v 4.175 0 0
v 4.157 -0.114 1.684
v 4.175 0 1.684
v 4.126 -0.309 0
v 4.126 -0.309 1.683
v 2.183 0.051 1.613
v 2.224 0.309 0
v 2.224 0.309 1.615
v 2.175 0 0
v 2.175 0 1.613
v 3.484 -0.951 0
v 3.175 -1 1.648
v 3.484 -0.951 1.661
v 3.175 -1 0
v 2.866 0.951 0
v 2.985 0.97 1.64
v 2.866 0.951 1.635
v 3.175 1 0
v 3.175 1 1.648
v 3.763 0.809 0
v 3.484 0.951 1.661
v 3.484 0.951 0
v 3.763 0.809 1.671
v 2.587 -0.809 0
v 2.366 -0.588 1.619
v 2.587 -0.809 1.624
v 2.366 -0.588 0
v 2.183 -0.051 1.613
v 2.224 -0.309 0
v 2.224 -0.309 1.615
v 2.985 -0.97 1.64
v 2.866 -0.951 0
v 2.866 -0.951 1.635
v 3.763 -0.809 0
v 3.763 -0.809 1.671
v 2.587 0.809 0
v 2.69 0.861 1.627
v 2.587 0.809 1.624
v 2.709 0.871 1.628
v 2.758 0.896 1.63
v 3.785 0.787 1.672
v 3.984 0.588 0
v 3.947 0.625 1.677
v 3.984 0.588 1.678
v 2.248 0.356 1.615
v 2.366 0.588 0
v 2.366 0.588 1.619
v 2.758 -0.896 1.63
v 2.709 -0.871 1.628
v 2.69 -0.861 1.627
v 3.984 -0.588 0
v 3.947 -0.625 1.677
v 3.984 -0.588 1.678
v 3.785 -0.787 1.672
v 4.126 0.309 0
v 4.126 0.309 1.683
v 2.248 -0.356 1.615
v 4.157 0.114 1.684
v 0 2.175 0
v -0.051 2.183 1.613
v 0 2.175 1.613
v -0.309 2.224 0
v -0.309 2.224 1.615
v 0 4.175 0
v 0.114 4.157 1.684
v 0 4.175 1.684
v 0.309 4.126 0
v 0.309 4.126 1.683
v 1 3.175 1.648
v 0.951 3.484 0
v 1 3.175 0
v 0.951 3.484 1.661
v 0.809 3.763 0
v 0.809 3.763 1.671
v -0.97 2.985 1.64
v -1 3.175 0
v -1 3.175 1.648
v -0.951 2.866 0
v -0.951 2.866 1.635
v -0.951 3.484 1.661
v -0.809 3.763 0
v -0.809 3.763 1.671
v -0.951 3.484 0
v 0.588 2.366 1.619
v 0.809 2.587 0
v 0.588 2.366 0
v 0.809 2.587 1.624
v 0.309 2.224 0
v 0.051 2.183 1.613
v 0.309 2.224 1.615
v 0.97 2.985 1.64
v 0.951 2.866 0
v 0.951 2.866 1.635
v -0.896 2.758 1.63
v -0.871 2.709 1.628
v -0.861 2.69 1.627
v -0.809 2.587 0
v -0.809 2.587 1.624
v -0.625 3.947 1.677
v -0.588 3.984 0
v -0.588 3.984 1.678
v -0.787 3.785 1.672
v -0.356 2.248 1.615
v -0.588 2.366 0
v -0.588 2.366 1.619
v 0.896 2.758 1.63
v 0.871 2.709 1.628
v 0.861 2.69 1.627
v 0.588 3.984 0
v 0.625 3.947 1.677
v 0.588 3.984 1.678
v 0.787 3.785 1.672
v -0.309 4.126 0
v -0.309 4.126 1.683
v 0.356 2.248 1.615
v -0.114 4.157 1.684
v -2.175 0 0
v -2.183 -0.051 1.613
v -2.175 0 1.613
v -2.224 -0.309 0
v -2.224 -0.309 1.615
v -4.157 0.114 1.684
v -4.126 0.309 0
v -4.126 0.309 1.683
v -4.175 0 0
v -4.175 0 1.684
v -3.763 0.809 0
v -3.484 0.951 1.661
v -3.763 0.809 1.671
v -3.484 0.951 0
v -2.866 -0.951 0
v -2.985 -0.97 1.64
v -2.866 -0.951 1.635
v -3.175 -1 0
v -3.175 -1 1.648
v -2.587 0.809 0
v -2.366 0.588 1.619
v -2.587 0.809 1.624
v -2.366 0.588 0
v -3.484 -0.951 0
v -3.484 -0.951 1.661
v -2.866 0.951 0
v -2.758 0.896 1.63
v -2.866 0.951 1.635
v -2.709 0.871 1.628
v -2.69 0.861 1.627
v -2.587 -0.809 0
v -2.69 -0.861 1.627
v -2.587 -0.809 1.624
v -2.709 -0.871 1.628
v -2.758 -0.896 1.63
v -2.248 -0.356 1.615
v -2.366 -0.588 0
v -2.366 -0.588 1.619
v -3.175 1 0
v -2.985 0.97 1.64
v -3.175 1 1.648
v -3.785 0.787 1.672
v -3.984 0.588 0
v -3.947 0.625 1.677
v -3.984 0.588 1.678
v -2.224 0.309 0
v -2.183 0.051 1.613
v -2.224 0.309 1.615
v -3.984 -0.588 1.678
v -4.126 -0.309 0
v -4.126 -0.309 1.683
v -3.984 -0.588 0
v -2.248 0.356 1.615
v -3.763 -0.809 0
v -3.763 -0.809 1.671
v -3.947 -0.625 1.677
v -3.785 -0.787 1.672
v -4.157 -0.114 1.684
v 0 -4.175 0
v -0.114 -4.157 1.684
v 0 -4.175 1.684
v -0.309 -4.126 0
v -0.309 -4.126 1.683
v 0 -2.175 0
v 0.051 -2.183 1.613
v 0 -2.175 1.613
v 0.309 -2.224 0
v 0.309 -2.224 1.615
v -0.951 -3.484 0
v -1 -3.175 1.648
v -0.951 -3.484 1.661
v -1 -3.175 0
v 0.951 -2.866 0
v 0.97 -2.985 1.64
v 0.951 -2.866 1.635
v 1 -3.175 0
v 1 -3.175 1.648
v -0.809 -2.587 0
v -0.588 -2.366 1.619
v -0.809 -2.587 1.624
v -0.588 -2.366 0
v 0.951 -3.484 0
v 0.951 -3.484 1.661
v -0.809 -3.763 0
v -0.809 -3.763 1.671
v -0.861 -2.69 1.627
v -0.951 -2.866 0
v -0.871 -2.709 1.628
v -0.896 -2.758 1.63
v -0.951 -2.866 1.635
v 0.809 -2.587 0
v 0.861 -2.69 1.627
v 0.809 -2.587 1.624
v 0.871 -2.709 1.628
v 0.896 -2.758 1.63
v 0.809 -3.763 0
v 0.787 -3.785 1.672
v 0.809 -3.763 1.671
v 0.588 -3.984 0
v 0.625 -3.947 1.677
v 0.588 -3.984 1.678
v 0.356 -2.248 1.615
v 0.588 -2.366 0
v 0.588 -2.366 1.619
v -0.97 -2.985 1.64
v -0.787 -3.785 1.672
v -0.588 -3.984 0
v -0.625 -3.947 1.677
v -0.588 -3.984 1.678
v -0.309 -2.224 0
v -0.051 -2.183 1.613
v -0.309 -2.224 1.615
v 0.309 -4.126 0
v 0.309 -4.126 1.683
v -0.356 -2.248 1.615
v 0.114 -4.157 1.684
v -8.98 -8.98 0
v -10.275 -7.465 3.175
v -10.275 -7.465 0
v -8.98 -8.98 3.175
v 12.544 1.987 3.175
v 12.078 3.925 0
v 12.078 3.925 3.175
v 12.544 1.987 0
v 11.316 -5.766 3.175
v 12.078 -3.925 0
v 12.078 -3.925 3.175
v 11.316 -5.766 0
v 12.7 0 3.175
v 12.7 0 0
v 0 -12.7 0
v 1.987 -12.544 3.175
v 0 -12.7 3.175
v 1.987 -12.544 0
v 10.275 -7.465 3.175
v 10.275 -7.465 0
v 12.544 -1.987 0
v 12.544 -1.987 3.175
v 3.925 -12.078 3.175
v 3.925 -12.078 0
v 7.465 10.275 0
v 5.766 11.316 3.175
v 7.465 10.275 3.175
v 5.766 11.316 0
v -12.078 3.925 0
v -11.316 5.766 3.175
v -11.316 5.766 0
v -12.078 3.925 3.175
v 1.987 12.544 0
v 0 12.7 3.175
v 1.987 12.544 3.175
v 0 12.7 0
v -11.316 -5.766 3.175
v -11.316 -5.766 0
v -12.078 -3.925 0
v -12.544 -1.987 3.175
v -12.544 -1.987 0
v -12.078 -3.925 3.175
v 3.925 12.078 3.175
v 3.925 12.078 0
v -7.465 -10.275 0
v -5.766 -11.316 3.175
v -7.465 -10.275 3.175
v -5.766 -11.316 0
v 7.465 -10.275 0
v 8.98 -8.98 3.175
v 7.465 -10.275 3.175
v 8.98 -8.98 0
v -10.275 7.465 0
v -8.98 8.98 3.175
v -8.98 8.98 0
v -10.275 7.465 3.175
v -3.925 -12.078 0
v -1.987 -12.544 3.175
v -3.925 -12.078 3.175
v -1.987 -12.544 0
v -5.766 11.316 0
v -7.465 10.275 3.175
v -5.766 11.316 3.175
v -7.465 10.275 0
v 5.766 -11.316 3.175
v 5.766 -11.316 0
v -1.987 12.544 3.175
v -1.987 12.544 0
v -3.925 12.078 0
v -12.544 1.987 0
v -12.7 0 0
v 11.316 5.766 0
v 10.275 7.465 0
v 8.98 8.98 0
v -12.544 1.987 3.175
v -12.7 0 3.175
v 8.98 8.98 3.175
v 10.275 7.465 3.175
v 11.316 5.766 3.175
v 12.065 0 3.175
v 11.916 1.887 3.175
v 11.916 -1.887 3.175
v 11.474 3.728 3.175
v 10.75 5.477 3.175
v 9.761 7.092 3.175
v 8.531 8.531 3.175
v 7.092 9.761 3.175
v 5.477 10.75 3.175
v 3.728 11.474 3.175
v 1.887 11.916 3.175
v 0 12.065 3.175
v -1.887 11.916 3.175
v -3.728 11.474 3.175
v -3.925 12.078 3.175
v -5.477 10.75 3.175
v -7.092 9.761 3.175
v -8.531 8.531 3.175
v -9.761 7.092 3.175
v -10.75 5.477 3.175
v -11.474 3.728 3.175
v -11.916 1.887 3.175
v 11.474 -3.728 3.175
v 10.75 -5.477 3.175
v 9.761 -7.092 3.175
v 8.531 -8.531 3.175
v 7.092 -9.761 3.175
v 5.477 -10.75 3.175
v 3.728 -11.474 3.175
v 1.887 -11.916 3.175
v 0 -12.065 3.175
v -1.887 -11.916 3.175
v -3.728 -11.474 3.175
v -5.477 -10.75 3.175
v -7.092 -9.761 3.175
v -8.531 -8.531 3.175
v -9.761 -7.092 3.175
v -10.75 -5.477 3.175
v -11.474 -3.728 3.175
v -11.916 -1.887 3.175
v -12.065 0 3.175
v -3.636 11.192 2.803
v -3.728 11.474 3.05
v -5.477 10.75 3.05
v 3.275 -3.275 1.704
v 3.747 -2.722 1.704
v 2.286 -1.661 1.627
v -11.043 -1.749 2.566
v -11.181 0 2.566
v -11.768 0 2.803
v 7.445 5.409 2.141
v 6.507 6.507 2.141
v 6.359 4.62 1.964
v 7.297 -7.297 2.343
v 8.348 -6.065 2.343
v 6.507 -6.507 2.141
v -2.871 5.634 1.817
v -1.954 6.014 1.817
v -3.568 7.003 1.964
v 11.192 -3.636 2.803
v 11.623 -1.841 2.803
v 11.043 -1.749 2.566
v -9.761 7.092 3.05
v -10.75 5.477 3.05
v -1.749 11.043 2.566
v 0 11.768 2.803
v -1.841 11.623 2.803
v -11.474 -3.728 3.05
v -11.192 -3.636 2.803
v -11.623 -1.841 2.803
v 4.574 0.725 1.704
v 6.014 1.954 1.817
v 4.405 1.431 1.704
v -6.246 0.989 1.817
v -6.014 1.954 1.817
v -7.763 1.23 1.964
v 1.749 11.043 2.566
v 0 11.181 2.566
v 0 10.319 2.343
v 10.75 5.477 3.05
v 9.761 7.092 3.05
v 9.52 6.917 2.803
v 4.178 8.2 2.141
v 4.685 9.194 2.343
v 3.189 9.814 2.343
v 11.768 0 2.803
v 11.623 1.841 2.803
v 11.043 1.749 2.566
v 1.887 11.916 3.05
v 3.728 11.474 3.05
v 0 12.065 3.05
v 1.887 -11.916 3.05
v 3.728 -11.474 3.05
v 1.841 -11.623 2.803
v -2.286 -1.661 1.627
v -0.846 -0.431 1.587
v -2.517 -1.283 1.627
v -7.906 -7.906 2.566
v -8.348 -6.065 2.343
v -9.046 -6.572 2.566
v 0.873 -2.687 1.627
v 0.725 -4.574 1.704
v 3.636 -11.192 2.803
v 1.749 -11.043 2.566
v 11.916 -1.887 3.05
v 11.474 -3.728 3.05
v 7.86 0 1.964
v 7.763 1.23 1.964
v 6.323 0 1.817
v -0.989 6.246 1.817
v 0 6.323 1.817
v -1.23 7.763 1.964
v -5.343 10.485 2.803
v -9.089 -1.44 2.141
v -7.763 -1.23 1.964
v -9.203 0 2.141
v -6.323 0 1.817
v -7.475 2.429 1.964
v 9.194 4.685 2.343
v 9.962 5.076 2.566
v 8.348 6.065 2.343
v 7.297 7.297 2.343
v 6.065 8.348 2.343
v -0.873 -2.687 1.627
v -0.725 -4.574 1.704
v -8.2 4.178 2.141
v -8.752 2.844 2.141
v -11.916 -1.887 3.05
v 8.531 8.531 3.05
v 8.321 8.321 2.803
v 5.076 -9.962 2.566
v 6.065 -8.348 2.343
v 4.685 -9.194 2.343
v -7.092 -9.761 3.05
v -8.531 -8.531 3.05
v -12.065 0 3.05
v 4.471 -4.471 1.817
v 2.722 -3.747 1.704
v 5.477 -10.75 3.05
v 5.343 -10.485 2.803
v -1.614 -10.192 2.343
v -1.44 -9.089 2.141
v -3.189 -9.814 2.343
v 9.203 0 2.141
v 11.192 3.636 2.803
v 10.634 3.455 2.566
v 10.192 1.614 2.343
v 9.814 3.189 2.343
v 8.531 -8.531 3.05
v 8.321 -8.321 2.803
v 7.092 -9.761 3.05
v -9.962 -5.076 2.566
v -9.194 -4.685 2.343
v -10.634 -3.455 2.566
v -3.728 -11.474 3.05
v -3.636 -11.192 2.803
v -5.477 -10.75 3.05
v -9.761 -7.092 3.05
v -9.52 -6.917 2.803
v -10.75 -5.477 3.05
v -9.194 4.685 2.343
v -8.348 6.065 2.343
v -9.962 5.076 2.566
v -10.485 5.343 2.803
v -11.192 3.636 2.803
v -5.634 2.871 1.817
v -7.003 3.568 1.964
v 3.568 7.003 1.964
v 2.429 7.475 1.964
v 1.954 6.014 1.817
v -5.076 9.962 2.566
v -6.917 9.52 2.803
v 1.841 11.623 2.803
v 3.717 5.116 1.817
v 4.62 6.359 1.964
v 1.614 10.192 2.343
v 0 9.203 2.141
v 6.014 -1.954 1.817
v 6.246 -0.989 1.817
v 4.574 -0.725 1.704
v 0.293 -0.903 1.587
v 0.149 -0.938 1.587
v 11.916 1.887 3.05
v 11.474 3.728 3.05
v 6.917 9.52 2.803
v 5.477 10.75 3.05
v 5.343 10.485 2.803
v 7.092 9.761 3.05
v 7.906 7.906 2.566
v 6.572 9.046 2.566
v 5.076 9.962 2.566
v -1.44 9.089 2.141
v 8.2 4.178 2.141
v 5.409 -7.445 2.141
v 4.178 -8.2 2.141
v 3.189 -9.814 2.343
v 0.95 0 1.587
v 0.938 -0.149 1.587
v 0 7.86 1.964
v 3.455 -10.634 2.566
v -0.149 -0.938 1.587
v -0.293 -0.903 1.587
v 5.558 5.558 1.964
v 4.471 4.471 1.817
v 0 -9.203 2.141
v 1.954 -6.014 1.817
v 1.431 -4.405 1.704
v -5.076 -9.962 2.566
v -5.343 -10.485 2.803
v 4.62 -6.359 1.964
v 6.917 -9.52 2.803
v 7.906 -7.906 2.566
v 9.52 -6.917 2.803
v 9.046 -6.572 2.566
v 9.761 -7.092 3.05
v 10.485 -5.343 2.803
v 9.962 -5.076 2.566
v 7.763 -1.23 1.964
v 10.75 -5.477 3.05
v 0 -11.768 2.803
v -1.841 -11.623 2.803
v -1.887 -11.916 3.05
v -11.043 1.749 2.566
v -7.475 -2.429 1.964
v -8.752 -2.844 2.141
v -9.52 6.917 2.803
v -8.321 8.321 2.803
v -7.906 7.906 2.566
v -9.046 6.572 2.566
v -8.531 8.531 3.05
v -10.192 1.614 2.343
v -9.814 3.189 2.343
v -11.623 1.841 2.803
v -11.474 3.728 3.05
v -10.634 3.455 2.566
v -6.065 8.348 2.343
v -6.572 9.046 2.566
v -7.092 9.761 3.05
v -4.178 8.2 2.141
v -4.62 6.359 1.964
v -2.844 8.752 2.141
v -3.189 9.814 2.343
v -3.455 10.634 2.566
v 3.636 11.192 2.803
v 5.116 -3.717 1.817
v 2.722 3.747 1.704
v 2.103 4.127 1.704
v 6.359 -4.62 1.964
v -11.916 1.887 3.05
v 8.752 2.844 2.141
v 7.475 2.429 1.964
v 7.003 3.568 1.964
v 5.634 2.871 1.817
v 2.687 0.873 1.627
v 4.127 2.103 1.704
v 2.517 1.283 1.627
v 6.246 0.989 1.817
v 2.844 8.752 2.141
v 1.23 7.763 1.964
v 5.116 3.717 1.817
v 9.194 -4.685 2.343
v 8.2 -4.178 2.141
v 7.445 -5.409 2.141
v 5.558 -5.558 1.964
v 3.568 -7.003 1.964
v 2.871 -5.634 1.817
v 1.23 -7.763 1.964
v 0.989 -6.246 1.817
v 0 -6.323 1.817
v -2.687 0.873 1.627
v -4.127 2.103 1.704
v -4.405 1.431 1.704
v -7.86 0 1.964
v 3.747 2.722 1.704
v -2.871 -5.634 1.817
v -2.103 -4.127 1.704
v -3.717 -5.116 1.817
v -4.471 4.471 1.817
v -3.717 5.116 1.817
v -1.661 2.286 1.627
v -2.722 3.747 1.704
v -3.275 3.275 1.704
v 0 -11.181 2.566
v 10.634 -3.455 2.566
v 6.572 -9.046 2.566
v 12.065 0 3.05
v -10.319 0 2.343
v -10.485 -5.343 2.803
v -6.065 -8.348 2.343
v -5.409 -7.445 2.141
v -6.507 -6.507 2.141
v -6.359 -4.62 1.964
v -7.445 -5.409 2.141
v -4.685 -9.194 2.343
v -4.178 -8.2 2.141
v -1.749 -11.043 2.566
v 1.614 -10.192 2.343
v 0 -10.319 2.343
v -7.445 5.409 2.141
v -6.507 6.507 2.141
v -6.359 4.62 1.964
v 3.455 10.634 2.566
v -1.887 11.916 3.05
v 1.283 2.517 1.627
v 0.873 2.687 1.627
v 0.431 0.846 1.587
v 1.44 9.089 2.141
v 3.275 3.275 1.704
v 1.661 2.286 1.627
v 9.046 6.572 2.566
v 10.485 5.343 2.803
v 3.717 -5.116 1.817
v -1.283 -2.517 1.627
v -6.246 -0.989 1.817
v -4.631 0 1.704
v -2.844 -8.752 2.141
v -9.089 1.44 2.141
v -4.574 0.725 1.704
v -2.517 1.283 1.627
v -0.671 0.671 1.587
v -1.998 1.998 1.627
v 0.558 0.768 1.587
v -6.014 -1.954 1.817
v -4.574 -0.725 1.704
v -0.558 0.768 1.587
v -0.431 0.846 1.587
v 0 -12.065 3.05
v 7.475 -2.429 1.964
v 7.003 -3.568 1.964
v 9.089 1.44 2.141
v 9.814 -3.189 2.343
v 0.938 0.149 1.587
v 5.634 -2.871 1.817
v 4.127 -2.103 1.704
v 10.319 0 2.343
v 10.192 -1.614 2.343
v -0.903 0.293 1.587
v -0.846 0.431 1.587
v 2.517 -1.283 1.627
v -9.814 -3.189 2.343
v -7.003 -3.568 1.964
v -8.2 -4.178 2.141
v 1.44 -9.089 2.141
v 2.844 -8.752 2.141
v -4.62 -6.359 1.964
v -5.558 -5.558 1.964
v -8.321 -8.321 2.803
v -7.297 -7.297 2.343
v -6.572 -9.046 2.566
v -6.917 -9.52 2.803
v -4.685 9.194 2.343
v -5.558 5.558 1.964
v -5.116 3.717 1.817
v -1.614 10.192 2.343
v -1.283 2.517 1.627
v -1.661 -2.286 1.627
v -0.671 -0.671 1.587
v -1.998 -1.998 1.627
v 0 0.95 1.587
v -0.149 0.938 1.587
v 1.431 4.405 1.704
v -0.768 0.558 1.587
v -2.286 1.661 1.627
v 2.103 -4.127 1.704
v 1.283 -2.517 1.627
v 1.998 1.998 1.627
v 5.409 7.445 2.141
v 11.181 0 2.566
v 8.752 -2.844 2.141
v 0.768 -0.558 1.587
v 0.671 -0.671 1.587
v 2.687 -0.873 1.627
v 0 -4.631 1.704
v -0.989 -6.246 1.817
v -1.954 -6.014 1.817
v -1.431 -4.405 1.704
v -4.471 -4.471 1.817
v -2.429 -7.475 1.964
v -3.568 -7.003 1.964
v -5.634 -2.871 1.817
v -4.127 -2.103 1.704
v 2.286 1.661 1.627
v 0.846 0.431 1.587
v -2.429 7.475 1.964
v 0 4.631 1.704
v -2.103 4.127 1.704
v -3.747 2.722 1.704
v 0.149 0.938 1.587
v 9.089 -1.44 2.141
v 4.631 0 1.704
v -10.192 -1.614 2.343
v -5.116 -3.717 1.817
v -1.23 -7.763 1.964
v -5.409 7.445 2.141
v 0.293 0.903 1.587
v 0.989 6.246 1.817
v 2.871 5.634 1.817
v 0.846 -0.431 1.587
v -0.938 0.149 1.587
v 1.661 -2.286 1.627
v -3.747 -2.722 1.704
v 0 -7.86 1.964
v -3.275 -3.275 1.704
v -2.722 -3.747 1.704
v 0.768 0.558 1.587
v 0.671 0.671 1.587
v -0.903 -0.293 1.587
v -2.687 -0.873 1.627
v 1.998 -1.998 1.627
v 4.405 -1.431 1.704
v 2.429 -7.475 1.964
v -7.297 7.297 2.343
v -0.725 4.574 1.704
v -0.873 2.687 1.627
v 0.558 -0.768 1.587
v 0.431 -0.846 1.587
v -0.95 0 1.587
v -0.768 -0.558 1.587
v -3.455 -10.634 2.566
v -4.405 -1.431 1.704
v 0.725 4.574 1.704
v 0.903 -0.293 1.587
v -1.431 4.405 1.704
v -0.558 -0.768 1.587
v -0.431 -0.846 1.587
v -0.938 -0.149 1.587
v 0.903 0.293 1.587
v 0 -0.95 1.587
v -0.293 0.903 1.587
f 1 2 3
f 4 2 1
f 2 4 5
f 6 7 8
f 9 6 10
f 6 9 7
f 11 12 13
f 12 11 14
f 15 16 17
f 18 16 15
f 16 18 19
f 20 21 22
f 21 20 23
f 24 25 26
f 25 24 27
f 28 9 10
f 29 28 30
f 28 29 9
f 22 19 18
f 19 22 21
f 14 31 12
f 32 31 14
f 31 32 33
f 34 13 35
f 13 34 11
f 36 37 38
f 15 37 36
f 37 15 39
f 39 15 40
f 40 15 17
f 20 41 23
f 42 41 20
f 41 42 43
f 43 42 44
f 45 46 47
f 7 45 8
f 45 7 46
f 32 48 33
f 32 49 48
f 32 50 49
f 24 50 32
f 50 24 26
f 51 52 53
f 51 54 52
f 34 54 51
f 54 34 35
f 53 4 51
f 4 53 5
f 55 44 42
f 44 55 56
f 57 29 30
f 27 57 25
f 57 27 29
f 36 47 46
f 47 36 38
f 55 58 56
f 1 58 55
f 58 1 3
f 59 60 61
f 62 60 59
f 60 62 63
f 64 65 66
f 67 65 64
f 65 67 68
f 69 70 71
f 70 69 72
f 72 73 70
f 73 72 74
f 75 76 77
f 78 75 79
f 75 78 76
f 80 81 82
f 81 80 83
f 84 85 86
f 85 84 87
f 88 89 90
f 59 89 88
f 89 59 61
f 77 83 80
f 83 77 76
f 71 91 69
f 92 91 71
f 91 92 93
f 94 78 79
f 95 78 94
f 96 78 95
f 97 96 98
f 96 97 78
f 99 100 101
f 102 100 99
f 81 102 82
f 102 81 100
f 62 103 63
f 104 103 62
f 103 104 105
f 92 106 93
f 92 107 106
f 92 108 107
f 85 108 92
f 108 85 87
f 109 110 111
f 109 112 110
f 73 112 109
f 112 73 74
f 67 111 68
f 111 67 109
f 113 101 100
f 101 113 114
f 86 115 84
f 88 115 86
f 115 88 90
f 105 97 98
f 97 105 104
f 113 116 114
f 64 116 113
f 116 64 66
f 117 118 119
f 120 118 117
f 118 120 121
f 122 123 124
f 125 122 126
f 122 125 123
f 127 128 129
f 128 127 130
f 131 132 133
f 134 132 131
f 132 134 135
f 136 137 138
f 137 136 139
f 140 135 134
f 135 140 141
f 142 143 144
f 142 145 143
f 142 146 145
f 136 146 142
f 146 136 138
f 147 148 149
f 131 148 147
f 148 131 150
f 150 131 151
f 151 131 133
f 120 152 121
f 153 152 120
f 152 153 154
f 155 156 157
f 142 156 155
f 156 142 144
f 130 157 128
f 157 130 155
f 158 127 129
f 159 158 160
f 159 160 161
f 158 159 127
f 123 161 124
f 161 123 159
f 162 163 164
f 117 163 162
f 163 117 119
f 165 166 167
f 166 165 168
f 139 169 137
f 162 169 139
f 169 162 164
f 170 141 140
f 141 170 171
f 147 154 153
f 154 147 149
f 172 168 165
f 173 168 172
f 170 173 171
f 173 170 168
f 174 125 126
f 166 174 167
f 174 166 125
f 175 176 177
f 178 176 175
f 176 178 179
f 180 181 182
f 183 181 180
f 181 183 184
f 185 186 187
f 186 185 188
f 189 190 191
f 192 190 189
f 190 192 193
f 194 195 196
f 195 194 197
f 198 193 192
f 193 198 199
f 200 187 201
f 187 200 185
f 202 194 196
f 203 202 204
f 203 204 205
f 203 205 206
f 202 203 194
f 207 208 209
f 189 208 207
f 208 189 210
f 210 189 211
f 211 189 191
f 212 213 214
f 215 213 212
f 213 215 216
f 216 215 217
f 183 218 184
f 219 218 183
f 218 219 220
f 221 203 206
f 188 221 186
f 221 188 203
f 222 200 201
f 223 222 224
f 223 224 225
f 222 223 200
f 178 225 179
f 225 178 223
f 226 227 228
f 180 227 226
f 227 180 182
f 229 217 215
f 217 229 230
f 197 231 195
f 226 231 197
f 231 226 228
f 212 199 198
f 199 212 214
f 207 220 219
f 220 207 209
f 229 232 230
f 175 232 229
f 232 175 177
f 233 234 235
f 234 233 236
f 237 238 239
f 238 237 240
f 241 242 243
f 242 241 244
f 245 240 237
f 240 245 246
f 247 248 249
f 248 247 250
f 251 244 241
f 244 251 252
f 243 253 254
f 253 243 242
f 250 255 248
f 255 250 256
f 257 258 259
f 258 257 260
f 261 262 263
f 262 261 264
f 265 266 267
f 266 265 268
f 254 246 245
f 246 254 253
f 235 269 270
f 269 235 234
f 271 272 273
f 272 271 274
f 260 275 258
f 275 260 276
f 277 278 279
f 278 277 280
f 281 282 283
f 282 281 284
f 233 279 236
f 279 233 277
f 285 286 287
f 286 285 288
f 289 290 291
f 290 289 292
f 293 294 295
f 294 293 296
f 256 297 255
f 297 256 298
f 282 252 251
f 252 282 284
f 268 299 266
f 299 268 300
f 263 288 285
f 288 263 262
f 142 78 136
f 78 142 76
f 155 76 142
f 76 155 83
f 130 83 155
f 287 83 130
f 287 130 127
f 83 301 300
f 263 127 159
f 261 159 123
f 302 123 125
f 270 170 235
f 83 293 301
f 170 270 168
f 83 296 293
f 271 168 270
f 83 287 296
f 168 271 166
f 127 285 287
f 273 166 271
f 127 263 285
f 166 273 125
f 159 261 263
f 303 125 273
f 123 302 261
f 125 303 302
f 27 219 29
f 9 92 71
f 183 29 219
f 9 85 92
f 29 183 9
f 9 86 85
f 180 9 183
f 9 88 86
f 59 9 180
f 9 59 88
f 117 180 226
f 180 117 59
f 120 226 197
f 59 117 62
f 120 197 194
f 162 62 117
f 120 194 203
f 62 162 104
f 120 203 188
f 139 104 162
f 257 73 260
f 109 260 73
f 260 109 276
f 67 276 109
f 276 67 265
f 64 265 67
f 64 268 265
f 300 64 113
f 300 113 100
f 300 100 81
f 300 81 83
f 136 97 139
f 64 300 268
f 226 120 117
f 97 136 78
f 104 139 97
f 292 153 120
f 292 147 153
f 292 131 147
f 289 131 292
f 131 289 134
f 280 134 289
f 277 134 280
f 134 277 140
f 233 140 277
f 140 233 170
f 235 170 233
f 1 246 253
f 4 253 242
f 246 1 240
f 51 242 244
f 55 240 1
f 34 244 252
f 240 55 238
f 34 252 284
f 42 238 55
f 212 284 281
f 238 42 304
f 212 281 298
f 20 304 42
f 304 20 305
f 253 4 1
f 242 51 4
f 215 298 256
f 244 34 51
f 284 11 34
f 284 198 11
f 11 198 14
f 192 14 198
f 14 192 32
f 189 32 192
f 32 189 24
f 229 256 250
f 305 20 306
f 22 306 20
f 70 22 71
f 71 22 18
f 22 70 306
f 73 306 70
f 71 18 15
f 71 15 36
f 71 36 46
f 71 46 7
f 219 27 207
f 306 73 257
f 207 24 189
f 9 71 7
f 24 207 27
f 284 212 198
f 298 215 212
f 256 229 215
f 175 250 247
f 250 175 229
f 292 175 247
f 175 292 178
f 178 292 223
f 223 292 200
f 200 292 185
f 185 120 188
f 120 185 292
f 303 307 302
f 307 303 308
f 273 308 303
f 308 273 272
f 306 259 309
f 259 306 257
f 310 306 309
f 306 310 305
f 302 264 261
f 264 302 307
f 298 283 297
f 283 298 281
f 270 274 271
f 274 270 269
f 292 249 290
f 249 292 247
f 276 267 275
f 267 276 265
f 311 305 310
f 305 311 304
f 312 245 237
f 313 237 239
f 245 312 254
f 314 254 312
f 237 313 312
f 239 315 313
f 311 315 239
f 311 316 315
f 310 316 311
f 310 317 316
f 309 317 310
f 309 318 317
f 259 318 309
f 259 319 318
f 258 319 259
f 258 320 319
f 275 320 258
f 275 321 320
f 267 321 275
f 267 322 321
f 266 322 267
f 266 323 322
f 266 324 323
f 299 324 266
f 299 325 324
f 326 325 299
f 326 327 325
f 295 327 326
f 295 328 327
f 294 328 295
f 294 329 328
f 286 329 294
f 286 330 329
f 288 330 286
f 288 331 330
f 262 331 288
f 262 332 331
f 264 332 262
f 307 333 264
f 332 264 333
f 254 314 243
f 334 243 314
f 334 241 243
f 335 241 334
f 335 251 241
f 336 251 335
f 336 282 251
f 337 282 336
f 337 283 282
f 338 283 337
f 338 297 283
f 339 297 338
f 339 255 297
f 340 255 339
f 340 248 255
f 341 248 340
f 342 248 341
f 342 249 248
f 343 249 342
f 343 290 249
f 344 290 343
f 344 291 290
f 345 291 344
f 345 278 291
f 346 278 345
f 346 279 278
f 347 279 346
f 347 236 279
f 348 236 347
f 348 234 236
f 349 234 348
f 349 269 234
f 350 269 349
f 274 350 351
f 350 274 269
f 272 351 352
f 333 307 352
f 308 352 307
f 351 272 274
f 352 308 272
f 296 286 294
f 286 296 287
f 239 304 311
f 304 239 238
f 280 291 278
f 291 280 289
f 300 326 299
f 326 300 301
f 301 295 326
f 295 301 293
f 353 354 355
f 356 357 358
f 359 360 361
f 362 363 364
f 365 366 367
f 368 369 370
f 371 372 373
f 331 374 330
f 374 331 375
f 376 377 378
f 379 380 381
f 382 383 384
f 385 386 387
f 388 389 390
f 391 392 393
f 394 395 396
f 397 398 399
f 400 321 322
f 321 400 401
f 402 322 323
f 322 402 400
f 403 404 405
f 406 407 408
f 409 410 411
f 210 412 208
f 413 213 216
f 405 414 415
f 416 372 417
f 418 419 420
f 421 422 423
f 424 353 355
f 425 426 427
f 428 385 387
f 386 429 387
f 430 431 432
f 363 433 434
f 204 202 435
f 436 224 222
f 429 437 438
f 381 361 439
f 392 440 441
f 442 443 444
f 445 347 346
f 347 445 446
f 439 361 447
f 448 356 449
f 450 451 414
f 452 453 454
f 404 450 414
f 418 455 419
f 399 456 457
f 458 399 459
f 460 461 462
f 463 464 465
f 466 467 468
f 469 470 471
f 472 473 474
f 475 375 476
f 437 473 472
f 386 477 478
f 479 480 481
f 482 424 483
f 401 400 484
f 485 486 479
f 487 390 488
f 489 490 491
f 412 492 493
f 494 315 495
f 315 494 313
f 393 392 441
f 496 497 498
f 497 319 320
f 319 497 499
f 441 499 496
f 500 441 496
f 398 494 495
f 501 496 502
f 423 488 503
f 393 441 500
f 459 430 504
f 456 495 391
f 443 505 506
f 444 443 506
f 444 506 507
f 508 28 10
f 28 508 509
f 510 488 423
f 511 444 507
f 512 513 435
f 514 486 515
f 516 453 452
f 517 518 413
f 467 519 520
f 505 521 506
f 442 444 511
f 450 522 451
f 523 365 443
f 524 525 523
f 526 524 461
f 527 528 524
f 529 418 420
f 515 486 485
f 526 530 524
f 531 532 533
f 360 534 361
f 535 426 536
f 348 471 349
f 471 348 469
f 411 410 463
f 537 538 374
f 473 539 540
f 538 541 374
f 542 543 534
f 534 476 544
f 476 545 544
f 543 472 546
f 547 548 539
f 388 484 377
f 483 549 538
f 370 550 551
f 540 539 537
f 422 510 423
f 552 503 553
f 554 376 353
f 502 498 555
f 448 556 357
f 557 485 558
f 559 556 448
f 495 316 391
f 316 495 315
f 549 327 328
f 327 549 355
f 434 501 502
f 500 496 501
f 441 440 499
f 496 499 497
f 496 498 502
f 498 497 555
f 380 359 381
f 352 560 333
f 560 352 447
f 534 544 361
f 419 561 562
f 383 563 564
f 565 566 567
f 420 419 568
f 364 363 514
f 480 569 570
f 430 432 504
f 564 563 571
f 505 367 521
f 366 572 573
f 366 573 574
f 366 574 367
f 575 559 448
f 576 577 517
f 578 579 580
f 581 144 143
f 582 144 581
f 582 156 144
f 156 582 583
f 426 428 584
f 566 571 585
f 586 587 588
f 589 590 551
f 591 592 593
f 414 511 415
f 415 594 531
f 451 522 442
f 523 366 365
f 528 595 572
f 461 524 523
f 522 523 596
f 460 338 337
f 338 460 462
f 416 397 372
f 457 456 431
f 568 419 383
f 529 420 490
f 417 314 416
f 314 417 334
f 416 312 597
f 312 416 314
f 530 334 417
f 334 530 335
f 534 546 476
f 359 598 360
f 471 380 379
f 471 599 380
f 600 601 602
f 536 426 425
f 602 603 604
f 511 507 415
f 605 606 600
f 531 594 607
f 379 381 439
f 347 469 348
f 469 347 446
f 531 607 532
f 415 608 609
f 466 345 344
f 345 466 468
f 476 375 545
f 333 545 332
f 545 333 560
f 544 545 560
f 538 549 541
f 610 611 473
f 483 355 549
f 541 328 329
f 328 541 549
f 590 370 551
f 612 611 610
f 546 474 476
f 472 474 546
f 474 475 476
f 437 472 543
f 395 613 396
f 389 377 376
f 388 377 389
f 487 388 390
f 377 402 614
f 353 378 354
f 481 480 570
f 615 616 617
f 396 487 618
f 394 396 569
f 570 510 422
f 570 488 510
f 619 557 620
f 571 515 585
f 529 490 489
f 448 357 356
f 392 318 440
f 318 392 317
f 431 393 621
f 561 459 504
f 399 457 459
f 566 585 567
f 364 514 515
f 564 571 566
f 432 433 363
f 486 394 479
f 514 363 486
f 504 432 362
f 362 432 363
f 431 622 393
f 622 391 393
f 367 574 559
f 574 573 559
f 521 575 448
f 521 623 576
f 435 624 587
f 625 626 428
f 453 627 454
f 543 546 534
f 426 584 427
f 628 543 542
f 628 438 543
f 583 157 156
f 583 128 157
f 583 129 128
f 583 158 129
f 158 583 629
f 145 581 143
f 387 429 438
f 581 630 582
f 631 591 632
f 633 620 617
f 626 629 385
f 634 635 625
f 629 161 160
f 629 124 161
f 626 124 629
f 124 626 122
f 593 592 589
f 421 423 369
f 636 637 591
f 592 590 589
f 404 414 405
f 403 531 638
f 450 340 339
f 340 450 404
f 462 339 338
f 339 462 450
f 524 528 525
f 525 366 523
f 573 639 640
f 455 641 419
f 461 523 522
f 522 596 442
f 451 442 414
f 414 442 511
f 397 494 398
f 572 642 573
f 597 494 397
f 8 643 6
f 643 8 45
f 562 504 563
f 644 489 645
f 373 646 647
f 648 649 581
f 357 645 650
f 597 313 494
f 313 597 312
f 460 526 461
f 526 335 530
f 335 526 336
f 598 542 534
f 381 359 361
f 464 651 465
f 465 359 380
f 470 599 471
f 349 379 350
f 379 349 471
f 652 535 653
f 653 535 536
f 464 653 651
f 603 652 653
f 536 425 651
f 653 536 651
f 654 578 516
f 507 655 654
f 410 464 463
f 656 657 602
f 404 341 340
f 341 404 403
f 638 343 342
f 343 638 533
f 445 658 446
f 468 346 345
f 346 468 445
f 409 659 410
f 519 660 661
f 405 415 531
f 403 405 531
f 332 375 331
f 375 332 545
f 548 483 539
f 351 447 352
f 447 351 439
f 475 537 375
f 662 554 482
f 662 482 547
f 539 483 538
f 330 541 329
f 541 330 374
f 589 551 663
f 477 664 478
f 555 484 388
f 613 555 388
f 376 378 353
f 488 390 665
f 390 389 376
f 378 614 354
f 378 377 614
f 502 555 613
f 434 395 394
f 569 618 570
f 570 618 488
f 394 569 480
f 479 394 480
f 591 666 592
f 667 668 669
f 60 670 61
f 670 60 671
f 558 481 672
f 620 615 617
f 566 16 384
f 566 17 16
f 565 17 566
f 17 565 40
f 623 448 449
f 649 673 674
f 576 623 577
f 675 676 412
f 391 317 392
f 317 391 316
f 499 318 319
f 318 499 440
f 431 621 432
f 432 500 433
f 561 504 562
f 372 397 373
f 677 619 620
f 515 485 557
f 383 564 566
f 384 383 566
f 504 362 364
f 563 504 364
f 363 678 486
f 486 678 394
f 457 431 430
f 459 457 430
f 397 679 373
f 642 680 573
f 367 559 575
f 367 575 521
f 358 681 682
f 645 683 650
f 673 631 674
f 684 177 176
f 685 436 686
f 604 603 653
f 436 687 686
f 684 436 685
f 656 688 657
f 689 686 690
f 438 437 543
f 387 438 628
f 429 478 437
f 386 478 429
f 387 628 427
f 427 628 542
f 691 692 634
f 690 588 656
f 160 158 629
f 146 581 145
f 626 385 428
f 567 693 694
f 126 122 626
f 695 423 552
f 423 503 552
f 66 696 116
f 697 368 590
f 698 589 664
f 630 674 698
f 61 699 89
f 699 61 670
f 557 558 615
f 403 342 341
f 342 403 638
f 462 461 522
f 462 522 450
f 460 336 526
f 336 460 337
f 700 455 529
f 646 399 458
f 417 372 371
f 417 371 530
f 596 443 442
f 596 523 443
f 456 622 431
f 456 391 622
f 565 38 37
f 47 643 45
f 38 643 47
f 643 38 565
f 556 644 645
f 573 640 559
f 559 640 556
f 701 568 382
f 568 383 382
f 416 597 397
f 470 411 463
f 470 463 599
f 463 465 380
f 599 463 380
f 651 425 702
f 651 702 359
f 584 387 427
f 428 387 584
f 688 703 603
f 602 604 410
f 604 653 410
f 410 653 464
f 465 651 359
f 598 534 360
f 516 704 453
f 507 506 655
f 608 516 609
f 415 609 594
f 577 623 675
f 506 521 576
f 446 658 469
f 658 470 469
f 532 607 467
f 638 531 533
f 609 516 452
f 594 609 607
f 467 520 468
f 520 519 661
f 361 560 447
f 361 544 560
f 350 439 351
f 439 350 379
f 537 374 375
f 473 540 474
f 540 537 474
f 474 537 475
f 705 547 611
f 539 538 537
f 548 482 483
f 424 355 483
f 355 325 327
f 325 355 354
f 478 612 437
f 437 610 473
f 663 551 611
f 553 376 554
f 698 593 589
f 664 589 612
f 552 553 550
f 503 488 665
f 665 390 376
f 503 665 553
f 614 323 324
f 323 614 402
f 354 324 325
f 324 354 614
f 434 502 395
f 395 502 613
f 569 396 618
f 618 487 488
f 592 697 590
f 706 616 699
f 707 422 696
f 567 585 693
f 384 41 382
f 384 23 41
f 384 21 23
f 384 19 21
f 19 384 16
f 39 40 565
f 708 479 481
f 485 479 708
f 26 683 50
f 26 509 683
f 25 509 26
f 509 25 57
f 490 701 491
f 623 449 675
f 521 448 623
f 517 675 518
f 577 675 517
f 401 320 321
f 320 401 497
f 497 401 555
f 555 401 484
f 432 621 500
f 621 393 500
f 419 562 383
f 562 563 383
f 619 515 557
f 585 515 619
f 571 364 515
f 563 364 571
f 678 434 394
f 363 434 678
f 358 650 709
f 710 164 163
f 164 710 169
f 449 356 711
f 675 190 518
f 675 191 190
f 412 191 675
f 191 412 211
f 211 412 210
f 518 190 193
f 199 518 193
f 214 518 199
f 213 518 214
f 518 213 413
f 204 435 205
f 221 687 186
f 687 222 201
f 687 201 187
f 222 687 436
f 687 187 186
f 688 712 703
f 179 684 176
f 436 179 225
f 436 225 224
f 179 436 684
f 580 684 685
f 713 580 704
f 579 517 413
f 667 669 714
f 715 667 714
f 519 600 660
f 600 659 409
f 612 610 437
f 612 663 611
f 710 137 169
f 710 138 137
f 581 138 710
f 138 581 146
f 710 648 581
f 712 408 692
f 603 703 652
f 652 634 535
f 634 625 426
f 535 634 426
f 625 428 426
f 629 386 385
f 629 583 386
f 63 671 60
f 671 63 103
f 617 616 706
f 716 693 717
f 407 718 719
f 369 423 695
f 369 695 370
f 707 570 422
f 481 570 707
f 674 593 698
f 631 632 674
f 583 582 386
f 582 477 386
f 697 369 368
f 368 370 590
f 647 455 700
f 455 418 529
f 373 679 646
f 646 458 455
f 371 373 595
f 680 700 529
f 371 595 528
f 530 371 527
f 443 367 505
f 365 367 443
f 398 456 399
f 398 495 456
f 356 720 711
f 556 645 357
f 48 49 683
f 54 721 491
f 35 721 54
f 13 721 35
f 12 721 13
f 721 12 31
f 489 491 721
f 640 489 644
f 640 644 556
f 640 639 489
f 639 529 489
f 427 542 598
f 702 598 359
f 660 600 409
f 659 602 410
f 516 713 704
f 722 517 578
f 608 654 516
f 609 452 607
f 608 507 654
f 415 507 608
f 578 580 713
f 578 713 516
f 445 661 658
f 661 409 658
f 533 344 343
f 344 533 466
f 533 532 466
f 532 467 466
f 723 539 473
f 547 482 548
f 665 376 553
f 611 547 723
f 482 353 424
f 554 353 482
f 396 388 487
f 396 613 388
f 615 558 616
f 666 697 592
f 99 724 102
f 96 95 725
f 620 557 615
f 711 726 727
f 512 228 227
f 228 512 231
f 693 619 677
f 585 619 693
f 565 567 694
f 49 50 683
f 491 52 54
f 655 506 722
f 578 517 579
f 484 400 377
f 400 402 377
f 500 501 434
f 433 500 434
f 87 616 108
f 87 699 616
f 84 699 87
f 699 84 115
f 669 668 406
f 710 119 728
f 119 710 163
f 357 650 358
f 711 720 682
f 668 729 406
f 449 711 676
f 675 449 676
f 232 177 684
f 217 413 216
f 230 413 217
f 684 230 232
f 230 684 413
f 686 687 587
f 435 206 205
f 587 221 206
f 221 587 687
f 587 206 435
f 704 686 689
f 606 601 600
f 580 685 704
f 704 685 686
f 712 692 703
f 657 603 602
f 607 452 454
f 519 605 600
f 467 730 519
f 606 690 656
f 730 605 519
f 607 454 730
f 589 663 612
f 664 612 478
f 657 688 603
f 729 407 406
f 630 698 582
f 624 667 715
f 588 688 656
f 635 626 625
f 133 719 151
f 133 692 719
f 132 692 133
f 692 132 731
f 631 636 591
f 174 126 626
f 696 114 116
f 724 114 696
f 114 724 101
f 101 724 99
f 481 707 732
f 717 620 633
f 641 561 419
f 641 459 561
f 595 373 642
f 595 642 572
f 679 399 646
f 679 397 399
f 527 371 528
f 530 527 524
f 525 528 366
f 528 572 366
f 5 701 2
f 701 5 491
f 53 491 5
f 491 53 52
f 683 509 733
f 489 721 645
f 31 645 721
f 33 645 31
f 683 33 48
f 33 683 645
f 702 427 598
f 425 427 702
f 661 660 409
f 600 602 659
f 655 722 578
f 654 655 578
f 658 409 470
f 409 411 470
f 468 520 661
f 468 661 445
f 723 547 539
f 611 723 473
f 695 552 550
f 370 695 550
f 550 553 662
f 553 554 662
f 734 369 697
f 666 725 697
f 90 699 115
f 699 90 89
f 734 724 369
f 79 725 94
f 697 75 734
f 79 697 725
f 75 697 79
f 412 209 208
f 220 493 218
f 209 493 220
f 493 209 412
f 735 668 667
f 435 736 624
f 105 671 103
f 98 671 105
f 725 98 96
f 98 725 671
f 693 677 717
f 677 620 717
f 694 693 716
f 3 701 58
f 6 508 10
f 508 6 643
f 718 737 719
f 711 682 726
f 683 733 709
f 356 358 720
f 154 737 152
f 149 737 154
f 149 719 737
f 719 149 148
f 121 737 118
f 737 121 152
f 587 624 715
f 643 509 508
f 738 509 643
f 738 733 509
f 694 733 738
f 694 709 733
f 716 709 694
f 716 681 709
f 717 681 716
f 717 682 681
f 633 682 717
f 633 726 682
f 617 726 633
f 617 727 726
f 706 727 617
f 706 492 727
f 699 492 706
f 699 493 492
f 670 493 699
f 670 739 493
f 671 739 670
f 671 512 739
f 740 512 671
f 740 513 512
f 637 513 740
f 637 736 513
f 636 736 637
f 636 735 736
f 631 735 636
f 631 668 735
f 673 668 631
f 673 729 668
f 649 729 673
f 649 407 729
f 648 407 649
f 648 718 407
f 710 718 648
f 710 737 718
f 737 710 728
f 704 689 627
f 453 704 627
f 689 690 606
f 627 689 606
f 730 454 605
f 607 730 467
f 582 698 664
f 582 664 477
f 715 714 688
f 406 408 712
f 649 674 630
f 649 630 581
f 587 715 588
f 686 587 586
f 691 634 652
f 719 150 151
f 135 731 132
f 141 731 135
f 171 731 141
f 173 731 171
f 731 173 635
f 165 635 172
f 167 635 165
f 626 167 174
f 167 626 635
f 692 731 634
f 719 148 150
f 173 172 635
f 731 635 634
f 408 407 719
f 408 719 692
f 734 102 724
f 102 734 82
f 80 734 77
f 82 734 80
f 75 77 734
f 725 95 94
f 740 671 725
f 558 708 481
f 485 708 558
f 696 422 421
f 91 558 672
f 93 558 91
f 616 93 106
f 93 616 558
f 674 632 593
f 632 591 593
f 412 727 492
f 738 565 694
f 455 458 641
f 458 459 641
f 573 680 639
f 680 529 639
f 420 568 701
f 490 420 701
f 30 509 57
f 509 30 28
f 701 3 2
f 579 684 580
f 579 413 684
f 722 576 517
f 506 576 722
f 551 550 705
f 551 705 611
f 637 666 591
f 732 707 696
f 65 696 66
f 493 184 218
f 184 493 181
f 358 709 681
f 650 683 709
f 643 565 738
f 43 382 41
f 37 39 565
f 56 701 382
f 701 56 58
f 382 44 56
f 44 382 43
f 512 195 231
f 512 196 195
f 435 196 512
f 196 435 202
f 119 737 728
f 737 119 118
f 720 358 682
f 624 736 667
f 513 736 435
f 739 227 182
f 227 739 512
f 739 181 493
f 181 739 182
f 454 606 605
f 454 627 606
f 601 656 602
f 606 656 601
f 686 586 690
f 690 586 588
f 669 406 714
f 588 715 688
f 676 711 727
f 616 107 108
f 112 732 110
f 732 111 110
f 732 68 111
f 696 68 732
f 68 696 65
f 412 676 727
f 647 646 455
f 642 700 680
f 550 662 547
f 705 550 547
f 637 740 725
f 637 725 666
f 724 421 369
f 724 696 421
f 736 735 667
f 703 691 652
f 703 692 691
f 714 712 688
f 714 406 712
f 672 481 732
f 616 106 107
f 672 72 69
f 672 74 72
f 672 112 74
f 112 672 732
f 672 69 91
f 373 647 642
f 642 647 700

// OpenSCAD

/* [Size of button] */
//other shapes will be inscribed in a circle with that diameter
diameter_of_button = 1;
height_of_button = .125;
/*[holes in the button]*/
radi_to_center_of_hole = .125;
diameter_of_hole = .0625;
number_of_holes = 4; //[2:8]

/*[advanced features]*/
//only mess with if you dare ^_^
ignore_error_messages = 2;//[1:true,2:false]

button_shape = 0; //[0: circle, 1: 5 point star, 2: 6 point star, 3: triangle, 4: square, 5: pentagon, 6: hexagon, 8: octogon, 9: heart, 10: android, 11: (also not ready yet) apple]
resoultion = 40;//[5:100]
rounded_center = 1;//[1:true,2:false]
//won't be implemented (yet...)
number_of_Colors = 1;


/* [Unit adjustment] */
//Basically are you using american units or real units
units_entered = 25.4;//[1:mm, 10:cm, 1000:meter, 25.4:inch, 304.8:foot]

//default is mm for most printers
desired_units_for_output = 1;//[1:mm, .1:cm, 0.001:meter, 0.0393701:inch, 0.00328084:foot]
//CUSTOMIZER VARIABLES END

unit_conversion_factor = units_entered*desired_units_for_output;

module base_shape (type_of_shape = 0){
	linear_extrude(height_of_button*unit_conversion_factor){
		if(type_of_shape == 0){
			//circle
			circle(diameter_of_button*unit_conversion_factor/2,$fn=resoultion);
		}
		else if(type_of_shape ==1){
			//5 point star
			rotate([0,0,-90]){
				polygon([[0,.5],[.476,.155],[.294,-.405],[-.294,-.405],[-.476,.155]]*diameter_of_button*unit_conversion_factor,[[0,2,4,1,3]]);
				polygon([[.113,.156],[.182,-.059],[0,-.192],[-.182,-.059],[-.113,.156]]*diameter_of_button*unit_conversion_factor,[[0,1,2,3,4]]);
			}
		}
		else if(type_of_shape ==2){
			//6 point star
			circle(diameter_of_button*unit_conversion_factor/2,$fn=3);
			rotate([0,0,180]){
				circle(diameter_of_button*unit_conversion_factor/2,$fn=3);
			}
		}
		else if(type_of_shape ==3){
			//triangle
			circle(diameter_of_button*unit_conversion_factor/2,$fn=3);
		}
		else if(type_of_shape ==4){
			//square
			circle(diameter_of_button*unit_conversion_factor/2,$fn=4);
		}
		else if(type_of_shape ==5){
			//pentagon
			circle(diameter_of_button*unit_conversion_factor/2,$fn=5);
		}
		else if(type_of_shape ==6){
			//hexagon
			circle(diameter_of_button*unit_conversion_factor/2,$fn=6);
		}
		else if(type_of_shape ==8){
			//octogon
				circle(diameter_of_button*unit_conversion_factor/2,$fn=8);
		}
		/*else if(true){
			text("invalid shape of button");
		}*/
		else if(type_of_shape == 9){
			rotate([0,0,90]){
				scale([diameter_of_button*unit_conversion_factor,diameter_of_button*unit_conversion_factor,0]){
					polygon([[.433,.25],[0,-.5],[-.433,.25],[-.393,.302],[-.342,.342],[-.281,.366],[-.217,.375],[-.152,.366],[-.092,.342],[-.04,.302],[0,.25],[.04,.302],[.092,.342],[.152,.366],[.217,.375],[.281,.366],[.342,.342],[.393,.302]]);
				}
			}
		}
		else if(type_of_shape ==10){
			//android
			scale([diameter_of_button*unit_conversion_factor,diameter_of_button*unit_conversion_factor,0]){
				translate([.25,0,0]){
					//head
					circle(.25,$fn = resoultion);
				}
				//body
				square(.5,center=true);
				translate([0,.25+.0312,0]){
					//left arm
					polygon(points=[[-.125,-.03125],[-.125,.03125],[.125,.03125],[.125,-.03125]]);
					translate([.125,0,0]){
						circle(.03125,$fn = resoultion);
					}
					translate([-.125,0,0]){
						circle(.03125,$fn = resoultion);
					}
				}
				translate([0,-.25-.0312,0]){
					//right arm
					polygon(points=[[-.125,-.03125],[-.125,.03125],[.125,.03125],[.125,-.03125]]);
					translate([.125,0,0]){
						circle(.03125,$fn = resoultion);
					}
					translate([-.125,0,0]){
						circle(.03125,$fn = resoultion);
					}
				}
				translate([-.25,.125,0]){
					//left leg
					polygon(points=[[-.125,-.0625],[-.125,.0625],[.125,.0625],[.125,-.0625]]);
					translate([-.125,0,0]){
						circle(.0625,$fn = resoultion);
					}
				}
				translate([-.25,-.125,0]){
					//right leg
					polygon(points=[[-.125,-.0625],[-.125,.0625],[.125,.0625],[.125,-.0625]]);
					translate([-.125,0,0]){
						circle(.0625,$fn = resoultion);
					}
				}
			}
			
		}
		else if(type_of_shape ==11){
			
		}
		//7: (not implemeted yet) android, 8: (also not ready yet) apple
	}
}
module holes_to_be_cut(){
	if(number_of_holes<2){
		if(number_of_holes==1){
			translate([0,0,-.1*unit_conversion_factor]){
				linear_extrude((height_of_button+1)*unit_conversion_factor)
						circle([diameter_of_hole*unit_conversion_factor,diameter_of_hole*unit_conversion_factor],$fn=resoultion/2);
				}
			}
		}
	else{
		for(angle = [0:number_of_holes])
		{
			rotate([0,0,360/number_of_holes*angle]){
				translate([radi_to_center_of_hole*unit_conversion_factor,0,-.1*unit_conversion_factor]){
					linear_extrude((height_of_button+1)*unit_conversion_factor)
						circle([diameter_of_hole*unit_conversion_factor,diameter_of_hole*unit_conversion_factor],$fn=resoultion/2);
				}
			}
		}
	}
}
module round_center(){
	translate([0,0,diameter_of_button*unit_conversion_factor*.125]){
		resize(newsize=[diameter_of_button*unit_conversion_factor*.95,diameter_of_button*unit_conversion_factor*.95,height_of_button*unit_conversion_factor],center=true){
				sphere(diameter_of_button*unit_conversion_factor,$fn=resoultion);
		}
	}
}
//user error message, aka warning you broke it
if(ignore_error_messages==1){
	difference(){
		base_shape(type_of_shape =button_shape);
		holes_to_be_cut();
		if(rounded_center==1){
			round_center();
		}
	}
}
else if(diameter_of_button<(diameter_of_hole+radi_to_center_of_hole)){
	linear_extrude(2){
		text("you broke me! make sure the holes are inside of the button. To ignore me select so in advanced options");
	}
}
else{
	difference(){
		base_shape(type_of_shape =button_shape);
		holes_to_be_cut();
		if(rounded_center==1){
			round_center();
		}
	}
}
